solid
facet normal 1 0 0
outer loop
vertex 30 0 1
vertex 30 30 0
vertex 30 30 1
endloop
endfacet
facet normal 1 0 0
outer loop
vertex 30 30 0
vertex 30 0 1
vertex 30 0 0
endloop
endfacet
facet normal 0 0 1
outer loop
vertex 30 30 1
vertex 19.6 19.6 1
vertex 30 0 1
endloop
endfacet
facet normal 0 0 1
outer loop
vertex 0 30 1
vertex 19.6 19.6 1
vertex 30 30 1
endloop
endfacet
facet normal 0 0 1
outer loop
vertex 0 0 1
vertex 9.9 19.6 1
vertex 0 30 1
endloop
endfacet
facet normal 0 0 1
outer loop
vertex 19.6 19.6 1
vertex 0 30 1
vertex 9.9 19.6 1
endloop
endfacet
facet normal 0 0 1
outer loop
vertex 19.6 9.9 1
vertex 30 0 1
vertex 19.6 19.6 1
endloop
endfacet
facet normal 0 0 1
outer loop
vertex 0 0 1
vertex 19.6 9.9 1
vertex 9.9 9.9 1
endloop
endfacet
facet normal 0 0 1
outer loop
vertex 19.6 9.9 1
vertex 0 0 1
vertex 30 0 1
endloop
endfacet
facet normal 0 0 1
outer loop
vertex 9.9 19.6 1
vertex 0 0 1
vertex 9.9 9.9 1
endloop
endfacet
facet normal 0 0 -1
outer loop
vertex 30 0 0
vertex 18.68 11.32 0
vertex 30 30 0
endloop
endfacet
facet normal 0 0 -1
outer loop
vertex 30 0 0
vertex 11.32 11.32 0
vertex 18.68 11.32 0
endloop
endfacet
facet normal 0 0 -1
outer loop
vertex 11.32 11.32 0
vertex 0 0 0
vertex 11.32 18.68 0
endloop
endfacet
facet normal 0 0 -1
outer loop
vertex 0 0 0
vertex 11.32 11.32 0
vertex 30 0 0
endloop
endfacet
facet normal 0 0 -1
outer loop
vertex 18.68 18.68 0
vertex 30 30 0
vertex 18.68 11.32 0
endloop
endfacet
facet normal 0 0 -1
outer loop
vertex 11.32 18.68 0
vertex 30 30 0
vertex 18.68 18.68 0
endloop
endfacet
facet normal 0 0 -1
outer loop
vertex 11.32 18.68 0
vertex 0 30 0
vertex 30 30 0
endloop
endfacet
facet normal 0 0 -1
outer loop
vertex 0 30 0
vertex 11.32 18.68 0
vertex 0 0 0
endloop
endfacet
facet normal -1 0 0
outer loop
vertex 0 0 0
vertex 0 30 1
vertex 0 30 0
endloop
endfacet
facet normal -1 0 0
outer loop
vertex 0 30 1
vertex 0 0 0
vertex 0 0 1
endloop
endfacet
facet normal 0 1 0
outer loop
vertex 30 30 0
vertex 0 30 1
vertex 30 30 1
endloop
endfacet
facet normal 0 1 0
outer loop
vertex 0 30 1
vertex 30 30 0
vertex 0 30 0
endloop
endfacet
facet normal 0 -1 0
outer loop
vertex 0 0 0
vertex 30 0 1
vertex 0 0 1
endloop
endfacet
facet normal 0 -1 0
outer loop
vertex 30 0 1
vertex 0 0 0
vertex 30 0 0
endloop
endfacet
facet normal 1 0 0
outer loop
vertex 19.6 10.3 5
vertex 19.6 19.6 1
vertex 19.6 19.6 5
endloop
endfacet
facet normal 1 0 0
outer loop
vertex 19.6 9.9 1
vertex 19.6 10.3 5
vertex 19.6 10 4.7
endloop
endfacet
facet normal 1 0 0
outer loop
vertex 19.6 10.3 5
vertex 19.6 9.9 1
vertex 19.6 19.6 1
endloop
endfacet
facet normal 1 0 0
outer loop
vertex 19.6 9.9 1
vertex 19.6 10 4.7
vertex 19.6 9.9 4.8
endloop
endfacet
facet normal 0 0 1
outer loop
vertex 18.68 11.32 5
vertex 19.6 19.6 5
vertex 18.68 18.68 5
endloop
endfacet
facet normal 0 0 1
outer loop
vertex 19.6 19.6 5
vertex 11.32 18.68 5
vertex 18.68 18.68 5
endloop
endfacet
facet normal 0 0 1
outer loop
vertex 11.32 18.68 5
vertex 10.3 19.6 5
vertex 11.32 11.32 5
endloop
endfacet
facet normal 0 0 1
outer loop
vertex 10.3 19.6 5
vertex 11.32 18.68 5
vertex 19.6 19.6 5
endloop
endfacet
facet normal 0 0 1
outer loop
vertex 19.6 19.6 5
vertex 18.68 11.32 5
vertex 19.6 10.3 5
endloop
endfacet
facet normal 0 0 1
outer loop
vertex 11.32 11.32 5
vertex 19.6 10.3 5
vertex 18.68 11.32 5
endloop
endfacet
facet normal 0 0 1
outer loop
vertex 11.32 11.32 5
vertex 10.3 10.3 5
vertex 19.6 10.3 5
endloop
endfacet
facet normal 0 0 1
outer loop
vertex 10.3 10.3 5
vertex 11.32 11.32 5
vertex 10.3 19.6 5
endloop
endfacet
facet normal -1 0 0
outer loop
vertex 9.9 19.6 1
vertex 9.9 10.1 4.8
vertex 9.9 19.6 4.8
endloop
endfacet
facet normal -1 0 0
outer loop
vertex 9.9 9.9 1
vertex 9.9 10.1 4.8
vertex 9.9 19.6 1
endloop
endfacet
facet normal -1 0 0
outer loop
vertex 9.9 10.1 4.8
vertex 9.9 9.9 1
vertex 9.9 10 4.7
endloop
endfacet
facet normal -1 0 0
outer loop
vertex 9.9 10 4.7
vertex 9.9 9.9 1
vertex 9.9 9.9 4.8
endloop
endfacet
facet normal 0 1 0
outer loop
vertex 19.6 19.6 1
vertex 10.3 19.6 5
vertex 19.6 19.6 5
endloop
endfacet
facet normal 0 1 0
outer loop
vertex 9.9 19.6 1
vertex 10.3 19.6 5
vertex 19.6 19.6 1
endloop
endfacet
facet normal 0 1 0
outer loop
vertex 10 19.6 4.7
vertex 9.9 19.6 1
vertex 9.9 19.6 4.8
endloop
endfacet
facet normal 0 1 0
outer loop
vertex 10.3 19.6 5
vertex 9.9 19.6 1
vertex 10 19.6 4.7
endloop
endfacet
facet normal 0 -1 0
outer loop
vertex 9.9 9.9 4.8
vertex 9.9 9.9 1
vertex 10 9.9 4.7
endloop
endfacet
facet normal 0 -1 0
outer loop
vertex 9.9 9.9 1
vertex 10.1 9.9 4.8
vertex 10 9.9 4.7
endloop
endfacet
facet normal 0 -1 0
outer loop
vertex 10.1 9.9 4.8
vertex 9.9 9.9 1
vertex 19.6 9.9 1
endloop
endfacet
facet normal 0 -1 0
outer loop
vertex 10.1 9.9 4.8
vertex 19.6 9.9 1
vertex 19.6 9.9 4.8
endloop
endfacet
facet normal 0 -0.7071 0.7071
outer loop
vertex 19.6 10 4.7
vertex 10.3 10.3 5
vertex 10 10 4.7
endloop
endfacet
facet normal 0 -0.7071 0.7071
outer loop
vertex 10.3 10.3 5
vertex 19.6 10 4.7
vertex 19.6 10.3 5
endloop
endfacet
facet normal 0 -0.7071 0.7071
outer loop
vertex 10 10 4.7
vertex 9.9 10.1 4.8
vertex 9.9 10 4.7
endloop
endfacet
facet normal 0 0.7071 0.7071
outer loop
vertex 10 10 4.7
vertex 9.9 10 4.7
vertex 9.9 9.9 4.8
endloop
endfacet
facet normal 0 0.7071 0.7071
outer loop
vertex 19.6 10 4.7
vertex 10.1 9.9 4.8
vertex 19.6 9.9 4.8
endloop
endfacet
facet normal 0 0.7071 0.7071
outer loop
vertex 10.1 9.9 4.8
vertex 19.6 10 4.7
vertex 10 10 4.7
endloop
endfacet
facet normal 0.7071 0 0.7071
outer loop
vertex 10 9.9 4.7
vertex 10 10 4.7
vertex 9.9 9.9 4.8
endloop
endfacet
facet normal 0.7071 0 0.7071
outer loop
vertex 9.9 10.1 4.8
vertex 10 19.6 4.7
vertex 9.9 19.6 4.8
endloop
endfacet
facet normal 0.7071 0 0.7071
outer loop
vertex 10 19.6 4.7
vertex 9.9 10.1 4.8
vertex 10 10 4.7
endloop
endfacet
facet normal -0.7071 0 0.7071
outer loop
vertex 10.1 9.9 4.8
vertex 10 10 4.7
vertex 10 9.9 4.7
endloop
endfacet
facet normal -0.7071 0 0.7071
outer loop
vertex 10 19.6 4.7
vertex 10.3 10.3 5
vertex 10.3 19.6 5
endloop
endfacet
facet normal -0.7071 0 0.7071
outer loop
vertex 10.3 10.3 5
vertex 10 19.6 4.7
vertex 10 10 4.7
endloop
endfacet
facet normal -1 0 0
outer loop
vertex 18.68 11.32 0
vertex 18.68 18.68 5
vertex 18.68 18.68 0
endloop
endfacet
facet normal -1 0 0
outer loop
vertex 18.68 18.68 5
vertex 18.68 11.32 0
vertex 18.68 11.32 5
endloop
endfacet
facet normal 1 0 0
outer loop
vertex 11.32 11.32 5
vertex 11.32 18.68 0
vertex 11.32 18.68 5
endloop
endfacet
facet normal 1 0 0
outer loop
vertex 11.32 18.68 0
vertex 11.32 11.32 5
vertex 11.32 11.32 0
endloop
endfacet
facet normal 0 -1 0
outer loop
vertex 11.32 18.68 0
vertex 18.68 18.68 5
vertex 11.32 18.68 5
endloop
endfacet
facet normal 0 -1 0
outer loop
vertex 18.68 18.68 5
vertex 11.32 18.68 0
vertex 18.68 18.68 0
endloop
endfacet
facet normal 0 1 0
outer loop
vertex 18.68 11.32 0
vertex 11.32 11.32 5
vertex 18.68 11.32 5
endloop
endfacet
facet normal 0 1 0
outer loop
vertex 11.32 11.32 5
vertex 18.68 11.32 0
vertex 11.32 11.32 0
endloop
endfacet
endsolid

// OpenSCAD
// file: ../configuration.scad
// Vyska vrstvy pro tisknuti dilu [mm]
layer_height = 0.25; //Slic3r->Print Settings->Layers and perimeters->Layer height

// Rezerva prumeru hlavy sroubu [mm]
spare = 1;
// Prumer hlavy M6 sroubu (pricte se rezerva) [mm]
M6_head_diameter = 10.6+spare;
//M6_head_diameter = 12+spare;

// Vyska hlavy M6 sroubu (dulezite pro zapusteni hlavy sroubu do plastu) [mm]
M6_head_height = 3.6;
//M6_head_height = 4.5;

//Prumery sroubu a tyci
M8_smooth_rod_diameter = 8.3;
M8_smooth_rod_diameter_catch = 8;
M6_diameter = 6.6;
M6_diamater_horizontal = 6.5;
M3_diameter = 3.7;
M3_diameter_horizontal = 3.5;

//Prumery matic
M3_nut_diameter = 7.0;
M3_nut_diameter_horizontal = 6.7;

//ALU profile parameters
ALU_cut_width = 7.9;
ALU_cut_width_horizontal = 7.7;

// Delka motoru (ovlivni dily pro osy Z a Y)
//SX17-1003LQFE (doporuceno hlavne na osu Z)
//motor_length = 29.5;
//SX17-1003 (doporuceno hlavne na osu Z)
motor_length = 34;
//SX17-1005
//motor_length = 40;
//SX17-0905 - zde je jiz problem s velkou vyskou motoru na ose Z - musi se upravit endstop-holder
//motor_length = 48;

// Sirka vytlacovaneho materialu [mm]
extrusion_width = 0.66; //Slic3r->Print Settings->Advanced->Default extrusion width

/// Vyberte typ remenu ******************************************************

// GT2 
//belt_tooth_distance = 2;
//belt_tooth_ratio = 0.6;

// T2.5
belt_tooth_distance = 2.5;
belt_tooth_ratio = 0.68;
// main file
// RebeliX
//
// profile cover hole
// GNU GPL v3
// Martin Neruda <neruda@reprap4u.cz>
// http://www.reprap4u.cz

include <../configuration.scad>

block_size=9.7;

difference(){
	union(){
		cube([30,30,4*layer_height]);
		translate([15-5.1,15-5.1,0]) cube([block_size,block_size,5]);
	}	
	// Nabeh
	translate([0,15-5,4.7]) rotate([45,0,0]) cube([40,3,3]);
	translate([0,15+5,4.7]) rotate([45,0,0]) cube([40,3,3]);
	translate([15-5,0,4.7]) rotate([45,0,90]) cube([40,3,3]);
	translate([15+5,0,4.7]) rotate([45,0,90]) cube([40,3,3]);
	// Otvor pro napajeci kabely
	translate([15,15,2]) cube([10-4*extrusion_width,10-4*extrusion_width,10], center=true);
}	
